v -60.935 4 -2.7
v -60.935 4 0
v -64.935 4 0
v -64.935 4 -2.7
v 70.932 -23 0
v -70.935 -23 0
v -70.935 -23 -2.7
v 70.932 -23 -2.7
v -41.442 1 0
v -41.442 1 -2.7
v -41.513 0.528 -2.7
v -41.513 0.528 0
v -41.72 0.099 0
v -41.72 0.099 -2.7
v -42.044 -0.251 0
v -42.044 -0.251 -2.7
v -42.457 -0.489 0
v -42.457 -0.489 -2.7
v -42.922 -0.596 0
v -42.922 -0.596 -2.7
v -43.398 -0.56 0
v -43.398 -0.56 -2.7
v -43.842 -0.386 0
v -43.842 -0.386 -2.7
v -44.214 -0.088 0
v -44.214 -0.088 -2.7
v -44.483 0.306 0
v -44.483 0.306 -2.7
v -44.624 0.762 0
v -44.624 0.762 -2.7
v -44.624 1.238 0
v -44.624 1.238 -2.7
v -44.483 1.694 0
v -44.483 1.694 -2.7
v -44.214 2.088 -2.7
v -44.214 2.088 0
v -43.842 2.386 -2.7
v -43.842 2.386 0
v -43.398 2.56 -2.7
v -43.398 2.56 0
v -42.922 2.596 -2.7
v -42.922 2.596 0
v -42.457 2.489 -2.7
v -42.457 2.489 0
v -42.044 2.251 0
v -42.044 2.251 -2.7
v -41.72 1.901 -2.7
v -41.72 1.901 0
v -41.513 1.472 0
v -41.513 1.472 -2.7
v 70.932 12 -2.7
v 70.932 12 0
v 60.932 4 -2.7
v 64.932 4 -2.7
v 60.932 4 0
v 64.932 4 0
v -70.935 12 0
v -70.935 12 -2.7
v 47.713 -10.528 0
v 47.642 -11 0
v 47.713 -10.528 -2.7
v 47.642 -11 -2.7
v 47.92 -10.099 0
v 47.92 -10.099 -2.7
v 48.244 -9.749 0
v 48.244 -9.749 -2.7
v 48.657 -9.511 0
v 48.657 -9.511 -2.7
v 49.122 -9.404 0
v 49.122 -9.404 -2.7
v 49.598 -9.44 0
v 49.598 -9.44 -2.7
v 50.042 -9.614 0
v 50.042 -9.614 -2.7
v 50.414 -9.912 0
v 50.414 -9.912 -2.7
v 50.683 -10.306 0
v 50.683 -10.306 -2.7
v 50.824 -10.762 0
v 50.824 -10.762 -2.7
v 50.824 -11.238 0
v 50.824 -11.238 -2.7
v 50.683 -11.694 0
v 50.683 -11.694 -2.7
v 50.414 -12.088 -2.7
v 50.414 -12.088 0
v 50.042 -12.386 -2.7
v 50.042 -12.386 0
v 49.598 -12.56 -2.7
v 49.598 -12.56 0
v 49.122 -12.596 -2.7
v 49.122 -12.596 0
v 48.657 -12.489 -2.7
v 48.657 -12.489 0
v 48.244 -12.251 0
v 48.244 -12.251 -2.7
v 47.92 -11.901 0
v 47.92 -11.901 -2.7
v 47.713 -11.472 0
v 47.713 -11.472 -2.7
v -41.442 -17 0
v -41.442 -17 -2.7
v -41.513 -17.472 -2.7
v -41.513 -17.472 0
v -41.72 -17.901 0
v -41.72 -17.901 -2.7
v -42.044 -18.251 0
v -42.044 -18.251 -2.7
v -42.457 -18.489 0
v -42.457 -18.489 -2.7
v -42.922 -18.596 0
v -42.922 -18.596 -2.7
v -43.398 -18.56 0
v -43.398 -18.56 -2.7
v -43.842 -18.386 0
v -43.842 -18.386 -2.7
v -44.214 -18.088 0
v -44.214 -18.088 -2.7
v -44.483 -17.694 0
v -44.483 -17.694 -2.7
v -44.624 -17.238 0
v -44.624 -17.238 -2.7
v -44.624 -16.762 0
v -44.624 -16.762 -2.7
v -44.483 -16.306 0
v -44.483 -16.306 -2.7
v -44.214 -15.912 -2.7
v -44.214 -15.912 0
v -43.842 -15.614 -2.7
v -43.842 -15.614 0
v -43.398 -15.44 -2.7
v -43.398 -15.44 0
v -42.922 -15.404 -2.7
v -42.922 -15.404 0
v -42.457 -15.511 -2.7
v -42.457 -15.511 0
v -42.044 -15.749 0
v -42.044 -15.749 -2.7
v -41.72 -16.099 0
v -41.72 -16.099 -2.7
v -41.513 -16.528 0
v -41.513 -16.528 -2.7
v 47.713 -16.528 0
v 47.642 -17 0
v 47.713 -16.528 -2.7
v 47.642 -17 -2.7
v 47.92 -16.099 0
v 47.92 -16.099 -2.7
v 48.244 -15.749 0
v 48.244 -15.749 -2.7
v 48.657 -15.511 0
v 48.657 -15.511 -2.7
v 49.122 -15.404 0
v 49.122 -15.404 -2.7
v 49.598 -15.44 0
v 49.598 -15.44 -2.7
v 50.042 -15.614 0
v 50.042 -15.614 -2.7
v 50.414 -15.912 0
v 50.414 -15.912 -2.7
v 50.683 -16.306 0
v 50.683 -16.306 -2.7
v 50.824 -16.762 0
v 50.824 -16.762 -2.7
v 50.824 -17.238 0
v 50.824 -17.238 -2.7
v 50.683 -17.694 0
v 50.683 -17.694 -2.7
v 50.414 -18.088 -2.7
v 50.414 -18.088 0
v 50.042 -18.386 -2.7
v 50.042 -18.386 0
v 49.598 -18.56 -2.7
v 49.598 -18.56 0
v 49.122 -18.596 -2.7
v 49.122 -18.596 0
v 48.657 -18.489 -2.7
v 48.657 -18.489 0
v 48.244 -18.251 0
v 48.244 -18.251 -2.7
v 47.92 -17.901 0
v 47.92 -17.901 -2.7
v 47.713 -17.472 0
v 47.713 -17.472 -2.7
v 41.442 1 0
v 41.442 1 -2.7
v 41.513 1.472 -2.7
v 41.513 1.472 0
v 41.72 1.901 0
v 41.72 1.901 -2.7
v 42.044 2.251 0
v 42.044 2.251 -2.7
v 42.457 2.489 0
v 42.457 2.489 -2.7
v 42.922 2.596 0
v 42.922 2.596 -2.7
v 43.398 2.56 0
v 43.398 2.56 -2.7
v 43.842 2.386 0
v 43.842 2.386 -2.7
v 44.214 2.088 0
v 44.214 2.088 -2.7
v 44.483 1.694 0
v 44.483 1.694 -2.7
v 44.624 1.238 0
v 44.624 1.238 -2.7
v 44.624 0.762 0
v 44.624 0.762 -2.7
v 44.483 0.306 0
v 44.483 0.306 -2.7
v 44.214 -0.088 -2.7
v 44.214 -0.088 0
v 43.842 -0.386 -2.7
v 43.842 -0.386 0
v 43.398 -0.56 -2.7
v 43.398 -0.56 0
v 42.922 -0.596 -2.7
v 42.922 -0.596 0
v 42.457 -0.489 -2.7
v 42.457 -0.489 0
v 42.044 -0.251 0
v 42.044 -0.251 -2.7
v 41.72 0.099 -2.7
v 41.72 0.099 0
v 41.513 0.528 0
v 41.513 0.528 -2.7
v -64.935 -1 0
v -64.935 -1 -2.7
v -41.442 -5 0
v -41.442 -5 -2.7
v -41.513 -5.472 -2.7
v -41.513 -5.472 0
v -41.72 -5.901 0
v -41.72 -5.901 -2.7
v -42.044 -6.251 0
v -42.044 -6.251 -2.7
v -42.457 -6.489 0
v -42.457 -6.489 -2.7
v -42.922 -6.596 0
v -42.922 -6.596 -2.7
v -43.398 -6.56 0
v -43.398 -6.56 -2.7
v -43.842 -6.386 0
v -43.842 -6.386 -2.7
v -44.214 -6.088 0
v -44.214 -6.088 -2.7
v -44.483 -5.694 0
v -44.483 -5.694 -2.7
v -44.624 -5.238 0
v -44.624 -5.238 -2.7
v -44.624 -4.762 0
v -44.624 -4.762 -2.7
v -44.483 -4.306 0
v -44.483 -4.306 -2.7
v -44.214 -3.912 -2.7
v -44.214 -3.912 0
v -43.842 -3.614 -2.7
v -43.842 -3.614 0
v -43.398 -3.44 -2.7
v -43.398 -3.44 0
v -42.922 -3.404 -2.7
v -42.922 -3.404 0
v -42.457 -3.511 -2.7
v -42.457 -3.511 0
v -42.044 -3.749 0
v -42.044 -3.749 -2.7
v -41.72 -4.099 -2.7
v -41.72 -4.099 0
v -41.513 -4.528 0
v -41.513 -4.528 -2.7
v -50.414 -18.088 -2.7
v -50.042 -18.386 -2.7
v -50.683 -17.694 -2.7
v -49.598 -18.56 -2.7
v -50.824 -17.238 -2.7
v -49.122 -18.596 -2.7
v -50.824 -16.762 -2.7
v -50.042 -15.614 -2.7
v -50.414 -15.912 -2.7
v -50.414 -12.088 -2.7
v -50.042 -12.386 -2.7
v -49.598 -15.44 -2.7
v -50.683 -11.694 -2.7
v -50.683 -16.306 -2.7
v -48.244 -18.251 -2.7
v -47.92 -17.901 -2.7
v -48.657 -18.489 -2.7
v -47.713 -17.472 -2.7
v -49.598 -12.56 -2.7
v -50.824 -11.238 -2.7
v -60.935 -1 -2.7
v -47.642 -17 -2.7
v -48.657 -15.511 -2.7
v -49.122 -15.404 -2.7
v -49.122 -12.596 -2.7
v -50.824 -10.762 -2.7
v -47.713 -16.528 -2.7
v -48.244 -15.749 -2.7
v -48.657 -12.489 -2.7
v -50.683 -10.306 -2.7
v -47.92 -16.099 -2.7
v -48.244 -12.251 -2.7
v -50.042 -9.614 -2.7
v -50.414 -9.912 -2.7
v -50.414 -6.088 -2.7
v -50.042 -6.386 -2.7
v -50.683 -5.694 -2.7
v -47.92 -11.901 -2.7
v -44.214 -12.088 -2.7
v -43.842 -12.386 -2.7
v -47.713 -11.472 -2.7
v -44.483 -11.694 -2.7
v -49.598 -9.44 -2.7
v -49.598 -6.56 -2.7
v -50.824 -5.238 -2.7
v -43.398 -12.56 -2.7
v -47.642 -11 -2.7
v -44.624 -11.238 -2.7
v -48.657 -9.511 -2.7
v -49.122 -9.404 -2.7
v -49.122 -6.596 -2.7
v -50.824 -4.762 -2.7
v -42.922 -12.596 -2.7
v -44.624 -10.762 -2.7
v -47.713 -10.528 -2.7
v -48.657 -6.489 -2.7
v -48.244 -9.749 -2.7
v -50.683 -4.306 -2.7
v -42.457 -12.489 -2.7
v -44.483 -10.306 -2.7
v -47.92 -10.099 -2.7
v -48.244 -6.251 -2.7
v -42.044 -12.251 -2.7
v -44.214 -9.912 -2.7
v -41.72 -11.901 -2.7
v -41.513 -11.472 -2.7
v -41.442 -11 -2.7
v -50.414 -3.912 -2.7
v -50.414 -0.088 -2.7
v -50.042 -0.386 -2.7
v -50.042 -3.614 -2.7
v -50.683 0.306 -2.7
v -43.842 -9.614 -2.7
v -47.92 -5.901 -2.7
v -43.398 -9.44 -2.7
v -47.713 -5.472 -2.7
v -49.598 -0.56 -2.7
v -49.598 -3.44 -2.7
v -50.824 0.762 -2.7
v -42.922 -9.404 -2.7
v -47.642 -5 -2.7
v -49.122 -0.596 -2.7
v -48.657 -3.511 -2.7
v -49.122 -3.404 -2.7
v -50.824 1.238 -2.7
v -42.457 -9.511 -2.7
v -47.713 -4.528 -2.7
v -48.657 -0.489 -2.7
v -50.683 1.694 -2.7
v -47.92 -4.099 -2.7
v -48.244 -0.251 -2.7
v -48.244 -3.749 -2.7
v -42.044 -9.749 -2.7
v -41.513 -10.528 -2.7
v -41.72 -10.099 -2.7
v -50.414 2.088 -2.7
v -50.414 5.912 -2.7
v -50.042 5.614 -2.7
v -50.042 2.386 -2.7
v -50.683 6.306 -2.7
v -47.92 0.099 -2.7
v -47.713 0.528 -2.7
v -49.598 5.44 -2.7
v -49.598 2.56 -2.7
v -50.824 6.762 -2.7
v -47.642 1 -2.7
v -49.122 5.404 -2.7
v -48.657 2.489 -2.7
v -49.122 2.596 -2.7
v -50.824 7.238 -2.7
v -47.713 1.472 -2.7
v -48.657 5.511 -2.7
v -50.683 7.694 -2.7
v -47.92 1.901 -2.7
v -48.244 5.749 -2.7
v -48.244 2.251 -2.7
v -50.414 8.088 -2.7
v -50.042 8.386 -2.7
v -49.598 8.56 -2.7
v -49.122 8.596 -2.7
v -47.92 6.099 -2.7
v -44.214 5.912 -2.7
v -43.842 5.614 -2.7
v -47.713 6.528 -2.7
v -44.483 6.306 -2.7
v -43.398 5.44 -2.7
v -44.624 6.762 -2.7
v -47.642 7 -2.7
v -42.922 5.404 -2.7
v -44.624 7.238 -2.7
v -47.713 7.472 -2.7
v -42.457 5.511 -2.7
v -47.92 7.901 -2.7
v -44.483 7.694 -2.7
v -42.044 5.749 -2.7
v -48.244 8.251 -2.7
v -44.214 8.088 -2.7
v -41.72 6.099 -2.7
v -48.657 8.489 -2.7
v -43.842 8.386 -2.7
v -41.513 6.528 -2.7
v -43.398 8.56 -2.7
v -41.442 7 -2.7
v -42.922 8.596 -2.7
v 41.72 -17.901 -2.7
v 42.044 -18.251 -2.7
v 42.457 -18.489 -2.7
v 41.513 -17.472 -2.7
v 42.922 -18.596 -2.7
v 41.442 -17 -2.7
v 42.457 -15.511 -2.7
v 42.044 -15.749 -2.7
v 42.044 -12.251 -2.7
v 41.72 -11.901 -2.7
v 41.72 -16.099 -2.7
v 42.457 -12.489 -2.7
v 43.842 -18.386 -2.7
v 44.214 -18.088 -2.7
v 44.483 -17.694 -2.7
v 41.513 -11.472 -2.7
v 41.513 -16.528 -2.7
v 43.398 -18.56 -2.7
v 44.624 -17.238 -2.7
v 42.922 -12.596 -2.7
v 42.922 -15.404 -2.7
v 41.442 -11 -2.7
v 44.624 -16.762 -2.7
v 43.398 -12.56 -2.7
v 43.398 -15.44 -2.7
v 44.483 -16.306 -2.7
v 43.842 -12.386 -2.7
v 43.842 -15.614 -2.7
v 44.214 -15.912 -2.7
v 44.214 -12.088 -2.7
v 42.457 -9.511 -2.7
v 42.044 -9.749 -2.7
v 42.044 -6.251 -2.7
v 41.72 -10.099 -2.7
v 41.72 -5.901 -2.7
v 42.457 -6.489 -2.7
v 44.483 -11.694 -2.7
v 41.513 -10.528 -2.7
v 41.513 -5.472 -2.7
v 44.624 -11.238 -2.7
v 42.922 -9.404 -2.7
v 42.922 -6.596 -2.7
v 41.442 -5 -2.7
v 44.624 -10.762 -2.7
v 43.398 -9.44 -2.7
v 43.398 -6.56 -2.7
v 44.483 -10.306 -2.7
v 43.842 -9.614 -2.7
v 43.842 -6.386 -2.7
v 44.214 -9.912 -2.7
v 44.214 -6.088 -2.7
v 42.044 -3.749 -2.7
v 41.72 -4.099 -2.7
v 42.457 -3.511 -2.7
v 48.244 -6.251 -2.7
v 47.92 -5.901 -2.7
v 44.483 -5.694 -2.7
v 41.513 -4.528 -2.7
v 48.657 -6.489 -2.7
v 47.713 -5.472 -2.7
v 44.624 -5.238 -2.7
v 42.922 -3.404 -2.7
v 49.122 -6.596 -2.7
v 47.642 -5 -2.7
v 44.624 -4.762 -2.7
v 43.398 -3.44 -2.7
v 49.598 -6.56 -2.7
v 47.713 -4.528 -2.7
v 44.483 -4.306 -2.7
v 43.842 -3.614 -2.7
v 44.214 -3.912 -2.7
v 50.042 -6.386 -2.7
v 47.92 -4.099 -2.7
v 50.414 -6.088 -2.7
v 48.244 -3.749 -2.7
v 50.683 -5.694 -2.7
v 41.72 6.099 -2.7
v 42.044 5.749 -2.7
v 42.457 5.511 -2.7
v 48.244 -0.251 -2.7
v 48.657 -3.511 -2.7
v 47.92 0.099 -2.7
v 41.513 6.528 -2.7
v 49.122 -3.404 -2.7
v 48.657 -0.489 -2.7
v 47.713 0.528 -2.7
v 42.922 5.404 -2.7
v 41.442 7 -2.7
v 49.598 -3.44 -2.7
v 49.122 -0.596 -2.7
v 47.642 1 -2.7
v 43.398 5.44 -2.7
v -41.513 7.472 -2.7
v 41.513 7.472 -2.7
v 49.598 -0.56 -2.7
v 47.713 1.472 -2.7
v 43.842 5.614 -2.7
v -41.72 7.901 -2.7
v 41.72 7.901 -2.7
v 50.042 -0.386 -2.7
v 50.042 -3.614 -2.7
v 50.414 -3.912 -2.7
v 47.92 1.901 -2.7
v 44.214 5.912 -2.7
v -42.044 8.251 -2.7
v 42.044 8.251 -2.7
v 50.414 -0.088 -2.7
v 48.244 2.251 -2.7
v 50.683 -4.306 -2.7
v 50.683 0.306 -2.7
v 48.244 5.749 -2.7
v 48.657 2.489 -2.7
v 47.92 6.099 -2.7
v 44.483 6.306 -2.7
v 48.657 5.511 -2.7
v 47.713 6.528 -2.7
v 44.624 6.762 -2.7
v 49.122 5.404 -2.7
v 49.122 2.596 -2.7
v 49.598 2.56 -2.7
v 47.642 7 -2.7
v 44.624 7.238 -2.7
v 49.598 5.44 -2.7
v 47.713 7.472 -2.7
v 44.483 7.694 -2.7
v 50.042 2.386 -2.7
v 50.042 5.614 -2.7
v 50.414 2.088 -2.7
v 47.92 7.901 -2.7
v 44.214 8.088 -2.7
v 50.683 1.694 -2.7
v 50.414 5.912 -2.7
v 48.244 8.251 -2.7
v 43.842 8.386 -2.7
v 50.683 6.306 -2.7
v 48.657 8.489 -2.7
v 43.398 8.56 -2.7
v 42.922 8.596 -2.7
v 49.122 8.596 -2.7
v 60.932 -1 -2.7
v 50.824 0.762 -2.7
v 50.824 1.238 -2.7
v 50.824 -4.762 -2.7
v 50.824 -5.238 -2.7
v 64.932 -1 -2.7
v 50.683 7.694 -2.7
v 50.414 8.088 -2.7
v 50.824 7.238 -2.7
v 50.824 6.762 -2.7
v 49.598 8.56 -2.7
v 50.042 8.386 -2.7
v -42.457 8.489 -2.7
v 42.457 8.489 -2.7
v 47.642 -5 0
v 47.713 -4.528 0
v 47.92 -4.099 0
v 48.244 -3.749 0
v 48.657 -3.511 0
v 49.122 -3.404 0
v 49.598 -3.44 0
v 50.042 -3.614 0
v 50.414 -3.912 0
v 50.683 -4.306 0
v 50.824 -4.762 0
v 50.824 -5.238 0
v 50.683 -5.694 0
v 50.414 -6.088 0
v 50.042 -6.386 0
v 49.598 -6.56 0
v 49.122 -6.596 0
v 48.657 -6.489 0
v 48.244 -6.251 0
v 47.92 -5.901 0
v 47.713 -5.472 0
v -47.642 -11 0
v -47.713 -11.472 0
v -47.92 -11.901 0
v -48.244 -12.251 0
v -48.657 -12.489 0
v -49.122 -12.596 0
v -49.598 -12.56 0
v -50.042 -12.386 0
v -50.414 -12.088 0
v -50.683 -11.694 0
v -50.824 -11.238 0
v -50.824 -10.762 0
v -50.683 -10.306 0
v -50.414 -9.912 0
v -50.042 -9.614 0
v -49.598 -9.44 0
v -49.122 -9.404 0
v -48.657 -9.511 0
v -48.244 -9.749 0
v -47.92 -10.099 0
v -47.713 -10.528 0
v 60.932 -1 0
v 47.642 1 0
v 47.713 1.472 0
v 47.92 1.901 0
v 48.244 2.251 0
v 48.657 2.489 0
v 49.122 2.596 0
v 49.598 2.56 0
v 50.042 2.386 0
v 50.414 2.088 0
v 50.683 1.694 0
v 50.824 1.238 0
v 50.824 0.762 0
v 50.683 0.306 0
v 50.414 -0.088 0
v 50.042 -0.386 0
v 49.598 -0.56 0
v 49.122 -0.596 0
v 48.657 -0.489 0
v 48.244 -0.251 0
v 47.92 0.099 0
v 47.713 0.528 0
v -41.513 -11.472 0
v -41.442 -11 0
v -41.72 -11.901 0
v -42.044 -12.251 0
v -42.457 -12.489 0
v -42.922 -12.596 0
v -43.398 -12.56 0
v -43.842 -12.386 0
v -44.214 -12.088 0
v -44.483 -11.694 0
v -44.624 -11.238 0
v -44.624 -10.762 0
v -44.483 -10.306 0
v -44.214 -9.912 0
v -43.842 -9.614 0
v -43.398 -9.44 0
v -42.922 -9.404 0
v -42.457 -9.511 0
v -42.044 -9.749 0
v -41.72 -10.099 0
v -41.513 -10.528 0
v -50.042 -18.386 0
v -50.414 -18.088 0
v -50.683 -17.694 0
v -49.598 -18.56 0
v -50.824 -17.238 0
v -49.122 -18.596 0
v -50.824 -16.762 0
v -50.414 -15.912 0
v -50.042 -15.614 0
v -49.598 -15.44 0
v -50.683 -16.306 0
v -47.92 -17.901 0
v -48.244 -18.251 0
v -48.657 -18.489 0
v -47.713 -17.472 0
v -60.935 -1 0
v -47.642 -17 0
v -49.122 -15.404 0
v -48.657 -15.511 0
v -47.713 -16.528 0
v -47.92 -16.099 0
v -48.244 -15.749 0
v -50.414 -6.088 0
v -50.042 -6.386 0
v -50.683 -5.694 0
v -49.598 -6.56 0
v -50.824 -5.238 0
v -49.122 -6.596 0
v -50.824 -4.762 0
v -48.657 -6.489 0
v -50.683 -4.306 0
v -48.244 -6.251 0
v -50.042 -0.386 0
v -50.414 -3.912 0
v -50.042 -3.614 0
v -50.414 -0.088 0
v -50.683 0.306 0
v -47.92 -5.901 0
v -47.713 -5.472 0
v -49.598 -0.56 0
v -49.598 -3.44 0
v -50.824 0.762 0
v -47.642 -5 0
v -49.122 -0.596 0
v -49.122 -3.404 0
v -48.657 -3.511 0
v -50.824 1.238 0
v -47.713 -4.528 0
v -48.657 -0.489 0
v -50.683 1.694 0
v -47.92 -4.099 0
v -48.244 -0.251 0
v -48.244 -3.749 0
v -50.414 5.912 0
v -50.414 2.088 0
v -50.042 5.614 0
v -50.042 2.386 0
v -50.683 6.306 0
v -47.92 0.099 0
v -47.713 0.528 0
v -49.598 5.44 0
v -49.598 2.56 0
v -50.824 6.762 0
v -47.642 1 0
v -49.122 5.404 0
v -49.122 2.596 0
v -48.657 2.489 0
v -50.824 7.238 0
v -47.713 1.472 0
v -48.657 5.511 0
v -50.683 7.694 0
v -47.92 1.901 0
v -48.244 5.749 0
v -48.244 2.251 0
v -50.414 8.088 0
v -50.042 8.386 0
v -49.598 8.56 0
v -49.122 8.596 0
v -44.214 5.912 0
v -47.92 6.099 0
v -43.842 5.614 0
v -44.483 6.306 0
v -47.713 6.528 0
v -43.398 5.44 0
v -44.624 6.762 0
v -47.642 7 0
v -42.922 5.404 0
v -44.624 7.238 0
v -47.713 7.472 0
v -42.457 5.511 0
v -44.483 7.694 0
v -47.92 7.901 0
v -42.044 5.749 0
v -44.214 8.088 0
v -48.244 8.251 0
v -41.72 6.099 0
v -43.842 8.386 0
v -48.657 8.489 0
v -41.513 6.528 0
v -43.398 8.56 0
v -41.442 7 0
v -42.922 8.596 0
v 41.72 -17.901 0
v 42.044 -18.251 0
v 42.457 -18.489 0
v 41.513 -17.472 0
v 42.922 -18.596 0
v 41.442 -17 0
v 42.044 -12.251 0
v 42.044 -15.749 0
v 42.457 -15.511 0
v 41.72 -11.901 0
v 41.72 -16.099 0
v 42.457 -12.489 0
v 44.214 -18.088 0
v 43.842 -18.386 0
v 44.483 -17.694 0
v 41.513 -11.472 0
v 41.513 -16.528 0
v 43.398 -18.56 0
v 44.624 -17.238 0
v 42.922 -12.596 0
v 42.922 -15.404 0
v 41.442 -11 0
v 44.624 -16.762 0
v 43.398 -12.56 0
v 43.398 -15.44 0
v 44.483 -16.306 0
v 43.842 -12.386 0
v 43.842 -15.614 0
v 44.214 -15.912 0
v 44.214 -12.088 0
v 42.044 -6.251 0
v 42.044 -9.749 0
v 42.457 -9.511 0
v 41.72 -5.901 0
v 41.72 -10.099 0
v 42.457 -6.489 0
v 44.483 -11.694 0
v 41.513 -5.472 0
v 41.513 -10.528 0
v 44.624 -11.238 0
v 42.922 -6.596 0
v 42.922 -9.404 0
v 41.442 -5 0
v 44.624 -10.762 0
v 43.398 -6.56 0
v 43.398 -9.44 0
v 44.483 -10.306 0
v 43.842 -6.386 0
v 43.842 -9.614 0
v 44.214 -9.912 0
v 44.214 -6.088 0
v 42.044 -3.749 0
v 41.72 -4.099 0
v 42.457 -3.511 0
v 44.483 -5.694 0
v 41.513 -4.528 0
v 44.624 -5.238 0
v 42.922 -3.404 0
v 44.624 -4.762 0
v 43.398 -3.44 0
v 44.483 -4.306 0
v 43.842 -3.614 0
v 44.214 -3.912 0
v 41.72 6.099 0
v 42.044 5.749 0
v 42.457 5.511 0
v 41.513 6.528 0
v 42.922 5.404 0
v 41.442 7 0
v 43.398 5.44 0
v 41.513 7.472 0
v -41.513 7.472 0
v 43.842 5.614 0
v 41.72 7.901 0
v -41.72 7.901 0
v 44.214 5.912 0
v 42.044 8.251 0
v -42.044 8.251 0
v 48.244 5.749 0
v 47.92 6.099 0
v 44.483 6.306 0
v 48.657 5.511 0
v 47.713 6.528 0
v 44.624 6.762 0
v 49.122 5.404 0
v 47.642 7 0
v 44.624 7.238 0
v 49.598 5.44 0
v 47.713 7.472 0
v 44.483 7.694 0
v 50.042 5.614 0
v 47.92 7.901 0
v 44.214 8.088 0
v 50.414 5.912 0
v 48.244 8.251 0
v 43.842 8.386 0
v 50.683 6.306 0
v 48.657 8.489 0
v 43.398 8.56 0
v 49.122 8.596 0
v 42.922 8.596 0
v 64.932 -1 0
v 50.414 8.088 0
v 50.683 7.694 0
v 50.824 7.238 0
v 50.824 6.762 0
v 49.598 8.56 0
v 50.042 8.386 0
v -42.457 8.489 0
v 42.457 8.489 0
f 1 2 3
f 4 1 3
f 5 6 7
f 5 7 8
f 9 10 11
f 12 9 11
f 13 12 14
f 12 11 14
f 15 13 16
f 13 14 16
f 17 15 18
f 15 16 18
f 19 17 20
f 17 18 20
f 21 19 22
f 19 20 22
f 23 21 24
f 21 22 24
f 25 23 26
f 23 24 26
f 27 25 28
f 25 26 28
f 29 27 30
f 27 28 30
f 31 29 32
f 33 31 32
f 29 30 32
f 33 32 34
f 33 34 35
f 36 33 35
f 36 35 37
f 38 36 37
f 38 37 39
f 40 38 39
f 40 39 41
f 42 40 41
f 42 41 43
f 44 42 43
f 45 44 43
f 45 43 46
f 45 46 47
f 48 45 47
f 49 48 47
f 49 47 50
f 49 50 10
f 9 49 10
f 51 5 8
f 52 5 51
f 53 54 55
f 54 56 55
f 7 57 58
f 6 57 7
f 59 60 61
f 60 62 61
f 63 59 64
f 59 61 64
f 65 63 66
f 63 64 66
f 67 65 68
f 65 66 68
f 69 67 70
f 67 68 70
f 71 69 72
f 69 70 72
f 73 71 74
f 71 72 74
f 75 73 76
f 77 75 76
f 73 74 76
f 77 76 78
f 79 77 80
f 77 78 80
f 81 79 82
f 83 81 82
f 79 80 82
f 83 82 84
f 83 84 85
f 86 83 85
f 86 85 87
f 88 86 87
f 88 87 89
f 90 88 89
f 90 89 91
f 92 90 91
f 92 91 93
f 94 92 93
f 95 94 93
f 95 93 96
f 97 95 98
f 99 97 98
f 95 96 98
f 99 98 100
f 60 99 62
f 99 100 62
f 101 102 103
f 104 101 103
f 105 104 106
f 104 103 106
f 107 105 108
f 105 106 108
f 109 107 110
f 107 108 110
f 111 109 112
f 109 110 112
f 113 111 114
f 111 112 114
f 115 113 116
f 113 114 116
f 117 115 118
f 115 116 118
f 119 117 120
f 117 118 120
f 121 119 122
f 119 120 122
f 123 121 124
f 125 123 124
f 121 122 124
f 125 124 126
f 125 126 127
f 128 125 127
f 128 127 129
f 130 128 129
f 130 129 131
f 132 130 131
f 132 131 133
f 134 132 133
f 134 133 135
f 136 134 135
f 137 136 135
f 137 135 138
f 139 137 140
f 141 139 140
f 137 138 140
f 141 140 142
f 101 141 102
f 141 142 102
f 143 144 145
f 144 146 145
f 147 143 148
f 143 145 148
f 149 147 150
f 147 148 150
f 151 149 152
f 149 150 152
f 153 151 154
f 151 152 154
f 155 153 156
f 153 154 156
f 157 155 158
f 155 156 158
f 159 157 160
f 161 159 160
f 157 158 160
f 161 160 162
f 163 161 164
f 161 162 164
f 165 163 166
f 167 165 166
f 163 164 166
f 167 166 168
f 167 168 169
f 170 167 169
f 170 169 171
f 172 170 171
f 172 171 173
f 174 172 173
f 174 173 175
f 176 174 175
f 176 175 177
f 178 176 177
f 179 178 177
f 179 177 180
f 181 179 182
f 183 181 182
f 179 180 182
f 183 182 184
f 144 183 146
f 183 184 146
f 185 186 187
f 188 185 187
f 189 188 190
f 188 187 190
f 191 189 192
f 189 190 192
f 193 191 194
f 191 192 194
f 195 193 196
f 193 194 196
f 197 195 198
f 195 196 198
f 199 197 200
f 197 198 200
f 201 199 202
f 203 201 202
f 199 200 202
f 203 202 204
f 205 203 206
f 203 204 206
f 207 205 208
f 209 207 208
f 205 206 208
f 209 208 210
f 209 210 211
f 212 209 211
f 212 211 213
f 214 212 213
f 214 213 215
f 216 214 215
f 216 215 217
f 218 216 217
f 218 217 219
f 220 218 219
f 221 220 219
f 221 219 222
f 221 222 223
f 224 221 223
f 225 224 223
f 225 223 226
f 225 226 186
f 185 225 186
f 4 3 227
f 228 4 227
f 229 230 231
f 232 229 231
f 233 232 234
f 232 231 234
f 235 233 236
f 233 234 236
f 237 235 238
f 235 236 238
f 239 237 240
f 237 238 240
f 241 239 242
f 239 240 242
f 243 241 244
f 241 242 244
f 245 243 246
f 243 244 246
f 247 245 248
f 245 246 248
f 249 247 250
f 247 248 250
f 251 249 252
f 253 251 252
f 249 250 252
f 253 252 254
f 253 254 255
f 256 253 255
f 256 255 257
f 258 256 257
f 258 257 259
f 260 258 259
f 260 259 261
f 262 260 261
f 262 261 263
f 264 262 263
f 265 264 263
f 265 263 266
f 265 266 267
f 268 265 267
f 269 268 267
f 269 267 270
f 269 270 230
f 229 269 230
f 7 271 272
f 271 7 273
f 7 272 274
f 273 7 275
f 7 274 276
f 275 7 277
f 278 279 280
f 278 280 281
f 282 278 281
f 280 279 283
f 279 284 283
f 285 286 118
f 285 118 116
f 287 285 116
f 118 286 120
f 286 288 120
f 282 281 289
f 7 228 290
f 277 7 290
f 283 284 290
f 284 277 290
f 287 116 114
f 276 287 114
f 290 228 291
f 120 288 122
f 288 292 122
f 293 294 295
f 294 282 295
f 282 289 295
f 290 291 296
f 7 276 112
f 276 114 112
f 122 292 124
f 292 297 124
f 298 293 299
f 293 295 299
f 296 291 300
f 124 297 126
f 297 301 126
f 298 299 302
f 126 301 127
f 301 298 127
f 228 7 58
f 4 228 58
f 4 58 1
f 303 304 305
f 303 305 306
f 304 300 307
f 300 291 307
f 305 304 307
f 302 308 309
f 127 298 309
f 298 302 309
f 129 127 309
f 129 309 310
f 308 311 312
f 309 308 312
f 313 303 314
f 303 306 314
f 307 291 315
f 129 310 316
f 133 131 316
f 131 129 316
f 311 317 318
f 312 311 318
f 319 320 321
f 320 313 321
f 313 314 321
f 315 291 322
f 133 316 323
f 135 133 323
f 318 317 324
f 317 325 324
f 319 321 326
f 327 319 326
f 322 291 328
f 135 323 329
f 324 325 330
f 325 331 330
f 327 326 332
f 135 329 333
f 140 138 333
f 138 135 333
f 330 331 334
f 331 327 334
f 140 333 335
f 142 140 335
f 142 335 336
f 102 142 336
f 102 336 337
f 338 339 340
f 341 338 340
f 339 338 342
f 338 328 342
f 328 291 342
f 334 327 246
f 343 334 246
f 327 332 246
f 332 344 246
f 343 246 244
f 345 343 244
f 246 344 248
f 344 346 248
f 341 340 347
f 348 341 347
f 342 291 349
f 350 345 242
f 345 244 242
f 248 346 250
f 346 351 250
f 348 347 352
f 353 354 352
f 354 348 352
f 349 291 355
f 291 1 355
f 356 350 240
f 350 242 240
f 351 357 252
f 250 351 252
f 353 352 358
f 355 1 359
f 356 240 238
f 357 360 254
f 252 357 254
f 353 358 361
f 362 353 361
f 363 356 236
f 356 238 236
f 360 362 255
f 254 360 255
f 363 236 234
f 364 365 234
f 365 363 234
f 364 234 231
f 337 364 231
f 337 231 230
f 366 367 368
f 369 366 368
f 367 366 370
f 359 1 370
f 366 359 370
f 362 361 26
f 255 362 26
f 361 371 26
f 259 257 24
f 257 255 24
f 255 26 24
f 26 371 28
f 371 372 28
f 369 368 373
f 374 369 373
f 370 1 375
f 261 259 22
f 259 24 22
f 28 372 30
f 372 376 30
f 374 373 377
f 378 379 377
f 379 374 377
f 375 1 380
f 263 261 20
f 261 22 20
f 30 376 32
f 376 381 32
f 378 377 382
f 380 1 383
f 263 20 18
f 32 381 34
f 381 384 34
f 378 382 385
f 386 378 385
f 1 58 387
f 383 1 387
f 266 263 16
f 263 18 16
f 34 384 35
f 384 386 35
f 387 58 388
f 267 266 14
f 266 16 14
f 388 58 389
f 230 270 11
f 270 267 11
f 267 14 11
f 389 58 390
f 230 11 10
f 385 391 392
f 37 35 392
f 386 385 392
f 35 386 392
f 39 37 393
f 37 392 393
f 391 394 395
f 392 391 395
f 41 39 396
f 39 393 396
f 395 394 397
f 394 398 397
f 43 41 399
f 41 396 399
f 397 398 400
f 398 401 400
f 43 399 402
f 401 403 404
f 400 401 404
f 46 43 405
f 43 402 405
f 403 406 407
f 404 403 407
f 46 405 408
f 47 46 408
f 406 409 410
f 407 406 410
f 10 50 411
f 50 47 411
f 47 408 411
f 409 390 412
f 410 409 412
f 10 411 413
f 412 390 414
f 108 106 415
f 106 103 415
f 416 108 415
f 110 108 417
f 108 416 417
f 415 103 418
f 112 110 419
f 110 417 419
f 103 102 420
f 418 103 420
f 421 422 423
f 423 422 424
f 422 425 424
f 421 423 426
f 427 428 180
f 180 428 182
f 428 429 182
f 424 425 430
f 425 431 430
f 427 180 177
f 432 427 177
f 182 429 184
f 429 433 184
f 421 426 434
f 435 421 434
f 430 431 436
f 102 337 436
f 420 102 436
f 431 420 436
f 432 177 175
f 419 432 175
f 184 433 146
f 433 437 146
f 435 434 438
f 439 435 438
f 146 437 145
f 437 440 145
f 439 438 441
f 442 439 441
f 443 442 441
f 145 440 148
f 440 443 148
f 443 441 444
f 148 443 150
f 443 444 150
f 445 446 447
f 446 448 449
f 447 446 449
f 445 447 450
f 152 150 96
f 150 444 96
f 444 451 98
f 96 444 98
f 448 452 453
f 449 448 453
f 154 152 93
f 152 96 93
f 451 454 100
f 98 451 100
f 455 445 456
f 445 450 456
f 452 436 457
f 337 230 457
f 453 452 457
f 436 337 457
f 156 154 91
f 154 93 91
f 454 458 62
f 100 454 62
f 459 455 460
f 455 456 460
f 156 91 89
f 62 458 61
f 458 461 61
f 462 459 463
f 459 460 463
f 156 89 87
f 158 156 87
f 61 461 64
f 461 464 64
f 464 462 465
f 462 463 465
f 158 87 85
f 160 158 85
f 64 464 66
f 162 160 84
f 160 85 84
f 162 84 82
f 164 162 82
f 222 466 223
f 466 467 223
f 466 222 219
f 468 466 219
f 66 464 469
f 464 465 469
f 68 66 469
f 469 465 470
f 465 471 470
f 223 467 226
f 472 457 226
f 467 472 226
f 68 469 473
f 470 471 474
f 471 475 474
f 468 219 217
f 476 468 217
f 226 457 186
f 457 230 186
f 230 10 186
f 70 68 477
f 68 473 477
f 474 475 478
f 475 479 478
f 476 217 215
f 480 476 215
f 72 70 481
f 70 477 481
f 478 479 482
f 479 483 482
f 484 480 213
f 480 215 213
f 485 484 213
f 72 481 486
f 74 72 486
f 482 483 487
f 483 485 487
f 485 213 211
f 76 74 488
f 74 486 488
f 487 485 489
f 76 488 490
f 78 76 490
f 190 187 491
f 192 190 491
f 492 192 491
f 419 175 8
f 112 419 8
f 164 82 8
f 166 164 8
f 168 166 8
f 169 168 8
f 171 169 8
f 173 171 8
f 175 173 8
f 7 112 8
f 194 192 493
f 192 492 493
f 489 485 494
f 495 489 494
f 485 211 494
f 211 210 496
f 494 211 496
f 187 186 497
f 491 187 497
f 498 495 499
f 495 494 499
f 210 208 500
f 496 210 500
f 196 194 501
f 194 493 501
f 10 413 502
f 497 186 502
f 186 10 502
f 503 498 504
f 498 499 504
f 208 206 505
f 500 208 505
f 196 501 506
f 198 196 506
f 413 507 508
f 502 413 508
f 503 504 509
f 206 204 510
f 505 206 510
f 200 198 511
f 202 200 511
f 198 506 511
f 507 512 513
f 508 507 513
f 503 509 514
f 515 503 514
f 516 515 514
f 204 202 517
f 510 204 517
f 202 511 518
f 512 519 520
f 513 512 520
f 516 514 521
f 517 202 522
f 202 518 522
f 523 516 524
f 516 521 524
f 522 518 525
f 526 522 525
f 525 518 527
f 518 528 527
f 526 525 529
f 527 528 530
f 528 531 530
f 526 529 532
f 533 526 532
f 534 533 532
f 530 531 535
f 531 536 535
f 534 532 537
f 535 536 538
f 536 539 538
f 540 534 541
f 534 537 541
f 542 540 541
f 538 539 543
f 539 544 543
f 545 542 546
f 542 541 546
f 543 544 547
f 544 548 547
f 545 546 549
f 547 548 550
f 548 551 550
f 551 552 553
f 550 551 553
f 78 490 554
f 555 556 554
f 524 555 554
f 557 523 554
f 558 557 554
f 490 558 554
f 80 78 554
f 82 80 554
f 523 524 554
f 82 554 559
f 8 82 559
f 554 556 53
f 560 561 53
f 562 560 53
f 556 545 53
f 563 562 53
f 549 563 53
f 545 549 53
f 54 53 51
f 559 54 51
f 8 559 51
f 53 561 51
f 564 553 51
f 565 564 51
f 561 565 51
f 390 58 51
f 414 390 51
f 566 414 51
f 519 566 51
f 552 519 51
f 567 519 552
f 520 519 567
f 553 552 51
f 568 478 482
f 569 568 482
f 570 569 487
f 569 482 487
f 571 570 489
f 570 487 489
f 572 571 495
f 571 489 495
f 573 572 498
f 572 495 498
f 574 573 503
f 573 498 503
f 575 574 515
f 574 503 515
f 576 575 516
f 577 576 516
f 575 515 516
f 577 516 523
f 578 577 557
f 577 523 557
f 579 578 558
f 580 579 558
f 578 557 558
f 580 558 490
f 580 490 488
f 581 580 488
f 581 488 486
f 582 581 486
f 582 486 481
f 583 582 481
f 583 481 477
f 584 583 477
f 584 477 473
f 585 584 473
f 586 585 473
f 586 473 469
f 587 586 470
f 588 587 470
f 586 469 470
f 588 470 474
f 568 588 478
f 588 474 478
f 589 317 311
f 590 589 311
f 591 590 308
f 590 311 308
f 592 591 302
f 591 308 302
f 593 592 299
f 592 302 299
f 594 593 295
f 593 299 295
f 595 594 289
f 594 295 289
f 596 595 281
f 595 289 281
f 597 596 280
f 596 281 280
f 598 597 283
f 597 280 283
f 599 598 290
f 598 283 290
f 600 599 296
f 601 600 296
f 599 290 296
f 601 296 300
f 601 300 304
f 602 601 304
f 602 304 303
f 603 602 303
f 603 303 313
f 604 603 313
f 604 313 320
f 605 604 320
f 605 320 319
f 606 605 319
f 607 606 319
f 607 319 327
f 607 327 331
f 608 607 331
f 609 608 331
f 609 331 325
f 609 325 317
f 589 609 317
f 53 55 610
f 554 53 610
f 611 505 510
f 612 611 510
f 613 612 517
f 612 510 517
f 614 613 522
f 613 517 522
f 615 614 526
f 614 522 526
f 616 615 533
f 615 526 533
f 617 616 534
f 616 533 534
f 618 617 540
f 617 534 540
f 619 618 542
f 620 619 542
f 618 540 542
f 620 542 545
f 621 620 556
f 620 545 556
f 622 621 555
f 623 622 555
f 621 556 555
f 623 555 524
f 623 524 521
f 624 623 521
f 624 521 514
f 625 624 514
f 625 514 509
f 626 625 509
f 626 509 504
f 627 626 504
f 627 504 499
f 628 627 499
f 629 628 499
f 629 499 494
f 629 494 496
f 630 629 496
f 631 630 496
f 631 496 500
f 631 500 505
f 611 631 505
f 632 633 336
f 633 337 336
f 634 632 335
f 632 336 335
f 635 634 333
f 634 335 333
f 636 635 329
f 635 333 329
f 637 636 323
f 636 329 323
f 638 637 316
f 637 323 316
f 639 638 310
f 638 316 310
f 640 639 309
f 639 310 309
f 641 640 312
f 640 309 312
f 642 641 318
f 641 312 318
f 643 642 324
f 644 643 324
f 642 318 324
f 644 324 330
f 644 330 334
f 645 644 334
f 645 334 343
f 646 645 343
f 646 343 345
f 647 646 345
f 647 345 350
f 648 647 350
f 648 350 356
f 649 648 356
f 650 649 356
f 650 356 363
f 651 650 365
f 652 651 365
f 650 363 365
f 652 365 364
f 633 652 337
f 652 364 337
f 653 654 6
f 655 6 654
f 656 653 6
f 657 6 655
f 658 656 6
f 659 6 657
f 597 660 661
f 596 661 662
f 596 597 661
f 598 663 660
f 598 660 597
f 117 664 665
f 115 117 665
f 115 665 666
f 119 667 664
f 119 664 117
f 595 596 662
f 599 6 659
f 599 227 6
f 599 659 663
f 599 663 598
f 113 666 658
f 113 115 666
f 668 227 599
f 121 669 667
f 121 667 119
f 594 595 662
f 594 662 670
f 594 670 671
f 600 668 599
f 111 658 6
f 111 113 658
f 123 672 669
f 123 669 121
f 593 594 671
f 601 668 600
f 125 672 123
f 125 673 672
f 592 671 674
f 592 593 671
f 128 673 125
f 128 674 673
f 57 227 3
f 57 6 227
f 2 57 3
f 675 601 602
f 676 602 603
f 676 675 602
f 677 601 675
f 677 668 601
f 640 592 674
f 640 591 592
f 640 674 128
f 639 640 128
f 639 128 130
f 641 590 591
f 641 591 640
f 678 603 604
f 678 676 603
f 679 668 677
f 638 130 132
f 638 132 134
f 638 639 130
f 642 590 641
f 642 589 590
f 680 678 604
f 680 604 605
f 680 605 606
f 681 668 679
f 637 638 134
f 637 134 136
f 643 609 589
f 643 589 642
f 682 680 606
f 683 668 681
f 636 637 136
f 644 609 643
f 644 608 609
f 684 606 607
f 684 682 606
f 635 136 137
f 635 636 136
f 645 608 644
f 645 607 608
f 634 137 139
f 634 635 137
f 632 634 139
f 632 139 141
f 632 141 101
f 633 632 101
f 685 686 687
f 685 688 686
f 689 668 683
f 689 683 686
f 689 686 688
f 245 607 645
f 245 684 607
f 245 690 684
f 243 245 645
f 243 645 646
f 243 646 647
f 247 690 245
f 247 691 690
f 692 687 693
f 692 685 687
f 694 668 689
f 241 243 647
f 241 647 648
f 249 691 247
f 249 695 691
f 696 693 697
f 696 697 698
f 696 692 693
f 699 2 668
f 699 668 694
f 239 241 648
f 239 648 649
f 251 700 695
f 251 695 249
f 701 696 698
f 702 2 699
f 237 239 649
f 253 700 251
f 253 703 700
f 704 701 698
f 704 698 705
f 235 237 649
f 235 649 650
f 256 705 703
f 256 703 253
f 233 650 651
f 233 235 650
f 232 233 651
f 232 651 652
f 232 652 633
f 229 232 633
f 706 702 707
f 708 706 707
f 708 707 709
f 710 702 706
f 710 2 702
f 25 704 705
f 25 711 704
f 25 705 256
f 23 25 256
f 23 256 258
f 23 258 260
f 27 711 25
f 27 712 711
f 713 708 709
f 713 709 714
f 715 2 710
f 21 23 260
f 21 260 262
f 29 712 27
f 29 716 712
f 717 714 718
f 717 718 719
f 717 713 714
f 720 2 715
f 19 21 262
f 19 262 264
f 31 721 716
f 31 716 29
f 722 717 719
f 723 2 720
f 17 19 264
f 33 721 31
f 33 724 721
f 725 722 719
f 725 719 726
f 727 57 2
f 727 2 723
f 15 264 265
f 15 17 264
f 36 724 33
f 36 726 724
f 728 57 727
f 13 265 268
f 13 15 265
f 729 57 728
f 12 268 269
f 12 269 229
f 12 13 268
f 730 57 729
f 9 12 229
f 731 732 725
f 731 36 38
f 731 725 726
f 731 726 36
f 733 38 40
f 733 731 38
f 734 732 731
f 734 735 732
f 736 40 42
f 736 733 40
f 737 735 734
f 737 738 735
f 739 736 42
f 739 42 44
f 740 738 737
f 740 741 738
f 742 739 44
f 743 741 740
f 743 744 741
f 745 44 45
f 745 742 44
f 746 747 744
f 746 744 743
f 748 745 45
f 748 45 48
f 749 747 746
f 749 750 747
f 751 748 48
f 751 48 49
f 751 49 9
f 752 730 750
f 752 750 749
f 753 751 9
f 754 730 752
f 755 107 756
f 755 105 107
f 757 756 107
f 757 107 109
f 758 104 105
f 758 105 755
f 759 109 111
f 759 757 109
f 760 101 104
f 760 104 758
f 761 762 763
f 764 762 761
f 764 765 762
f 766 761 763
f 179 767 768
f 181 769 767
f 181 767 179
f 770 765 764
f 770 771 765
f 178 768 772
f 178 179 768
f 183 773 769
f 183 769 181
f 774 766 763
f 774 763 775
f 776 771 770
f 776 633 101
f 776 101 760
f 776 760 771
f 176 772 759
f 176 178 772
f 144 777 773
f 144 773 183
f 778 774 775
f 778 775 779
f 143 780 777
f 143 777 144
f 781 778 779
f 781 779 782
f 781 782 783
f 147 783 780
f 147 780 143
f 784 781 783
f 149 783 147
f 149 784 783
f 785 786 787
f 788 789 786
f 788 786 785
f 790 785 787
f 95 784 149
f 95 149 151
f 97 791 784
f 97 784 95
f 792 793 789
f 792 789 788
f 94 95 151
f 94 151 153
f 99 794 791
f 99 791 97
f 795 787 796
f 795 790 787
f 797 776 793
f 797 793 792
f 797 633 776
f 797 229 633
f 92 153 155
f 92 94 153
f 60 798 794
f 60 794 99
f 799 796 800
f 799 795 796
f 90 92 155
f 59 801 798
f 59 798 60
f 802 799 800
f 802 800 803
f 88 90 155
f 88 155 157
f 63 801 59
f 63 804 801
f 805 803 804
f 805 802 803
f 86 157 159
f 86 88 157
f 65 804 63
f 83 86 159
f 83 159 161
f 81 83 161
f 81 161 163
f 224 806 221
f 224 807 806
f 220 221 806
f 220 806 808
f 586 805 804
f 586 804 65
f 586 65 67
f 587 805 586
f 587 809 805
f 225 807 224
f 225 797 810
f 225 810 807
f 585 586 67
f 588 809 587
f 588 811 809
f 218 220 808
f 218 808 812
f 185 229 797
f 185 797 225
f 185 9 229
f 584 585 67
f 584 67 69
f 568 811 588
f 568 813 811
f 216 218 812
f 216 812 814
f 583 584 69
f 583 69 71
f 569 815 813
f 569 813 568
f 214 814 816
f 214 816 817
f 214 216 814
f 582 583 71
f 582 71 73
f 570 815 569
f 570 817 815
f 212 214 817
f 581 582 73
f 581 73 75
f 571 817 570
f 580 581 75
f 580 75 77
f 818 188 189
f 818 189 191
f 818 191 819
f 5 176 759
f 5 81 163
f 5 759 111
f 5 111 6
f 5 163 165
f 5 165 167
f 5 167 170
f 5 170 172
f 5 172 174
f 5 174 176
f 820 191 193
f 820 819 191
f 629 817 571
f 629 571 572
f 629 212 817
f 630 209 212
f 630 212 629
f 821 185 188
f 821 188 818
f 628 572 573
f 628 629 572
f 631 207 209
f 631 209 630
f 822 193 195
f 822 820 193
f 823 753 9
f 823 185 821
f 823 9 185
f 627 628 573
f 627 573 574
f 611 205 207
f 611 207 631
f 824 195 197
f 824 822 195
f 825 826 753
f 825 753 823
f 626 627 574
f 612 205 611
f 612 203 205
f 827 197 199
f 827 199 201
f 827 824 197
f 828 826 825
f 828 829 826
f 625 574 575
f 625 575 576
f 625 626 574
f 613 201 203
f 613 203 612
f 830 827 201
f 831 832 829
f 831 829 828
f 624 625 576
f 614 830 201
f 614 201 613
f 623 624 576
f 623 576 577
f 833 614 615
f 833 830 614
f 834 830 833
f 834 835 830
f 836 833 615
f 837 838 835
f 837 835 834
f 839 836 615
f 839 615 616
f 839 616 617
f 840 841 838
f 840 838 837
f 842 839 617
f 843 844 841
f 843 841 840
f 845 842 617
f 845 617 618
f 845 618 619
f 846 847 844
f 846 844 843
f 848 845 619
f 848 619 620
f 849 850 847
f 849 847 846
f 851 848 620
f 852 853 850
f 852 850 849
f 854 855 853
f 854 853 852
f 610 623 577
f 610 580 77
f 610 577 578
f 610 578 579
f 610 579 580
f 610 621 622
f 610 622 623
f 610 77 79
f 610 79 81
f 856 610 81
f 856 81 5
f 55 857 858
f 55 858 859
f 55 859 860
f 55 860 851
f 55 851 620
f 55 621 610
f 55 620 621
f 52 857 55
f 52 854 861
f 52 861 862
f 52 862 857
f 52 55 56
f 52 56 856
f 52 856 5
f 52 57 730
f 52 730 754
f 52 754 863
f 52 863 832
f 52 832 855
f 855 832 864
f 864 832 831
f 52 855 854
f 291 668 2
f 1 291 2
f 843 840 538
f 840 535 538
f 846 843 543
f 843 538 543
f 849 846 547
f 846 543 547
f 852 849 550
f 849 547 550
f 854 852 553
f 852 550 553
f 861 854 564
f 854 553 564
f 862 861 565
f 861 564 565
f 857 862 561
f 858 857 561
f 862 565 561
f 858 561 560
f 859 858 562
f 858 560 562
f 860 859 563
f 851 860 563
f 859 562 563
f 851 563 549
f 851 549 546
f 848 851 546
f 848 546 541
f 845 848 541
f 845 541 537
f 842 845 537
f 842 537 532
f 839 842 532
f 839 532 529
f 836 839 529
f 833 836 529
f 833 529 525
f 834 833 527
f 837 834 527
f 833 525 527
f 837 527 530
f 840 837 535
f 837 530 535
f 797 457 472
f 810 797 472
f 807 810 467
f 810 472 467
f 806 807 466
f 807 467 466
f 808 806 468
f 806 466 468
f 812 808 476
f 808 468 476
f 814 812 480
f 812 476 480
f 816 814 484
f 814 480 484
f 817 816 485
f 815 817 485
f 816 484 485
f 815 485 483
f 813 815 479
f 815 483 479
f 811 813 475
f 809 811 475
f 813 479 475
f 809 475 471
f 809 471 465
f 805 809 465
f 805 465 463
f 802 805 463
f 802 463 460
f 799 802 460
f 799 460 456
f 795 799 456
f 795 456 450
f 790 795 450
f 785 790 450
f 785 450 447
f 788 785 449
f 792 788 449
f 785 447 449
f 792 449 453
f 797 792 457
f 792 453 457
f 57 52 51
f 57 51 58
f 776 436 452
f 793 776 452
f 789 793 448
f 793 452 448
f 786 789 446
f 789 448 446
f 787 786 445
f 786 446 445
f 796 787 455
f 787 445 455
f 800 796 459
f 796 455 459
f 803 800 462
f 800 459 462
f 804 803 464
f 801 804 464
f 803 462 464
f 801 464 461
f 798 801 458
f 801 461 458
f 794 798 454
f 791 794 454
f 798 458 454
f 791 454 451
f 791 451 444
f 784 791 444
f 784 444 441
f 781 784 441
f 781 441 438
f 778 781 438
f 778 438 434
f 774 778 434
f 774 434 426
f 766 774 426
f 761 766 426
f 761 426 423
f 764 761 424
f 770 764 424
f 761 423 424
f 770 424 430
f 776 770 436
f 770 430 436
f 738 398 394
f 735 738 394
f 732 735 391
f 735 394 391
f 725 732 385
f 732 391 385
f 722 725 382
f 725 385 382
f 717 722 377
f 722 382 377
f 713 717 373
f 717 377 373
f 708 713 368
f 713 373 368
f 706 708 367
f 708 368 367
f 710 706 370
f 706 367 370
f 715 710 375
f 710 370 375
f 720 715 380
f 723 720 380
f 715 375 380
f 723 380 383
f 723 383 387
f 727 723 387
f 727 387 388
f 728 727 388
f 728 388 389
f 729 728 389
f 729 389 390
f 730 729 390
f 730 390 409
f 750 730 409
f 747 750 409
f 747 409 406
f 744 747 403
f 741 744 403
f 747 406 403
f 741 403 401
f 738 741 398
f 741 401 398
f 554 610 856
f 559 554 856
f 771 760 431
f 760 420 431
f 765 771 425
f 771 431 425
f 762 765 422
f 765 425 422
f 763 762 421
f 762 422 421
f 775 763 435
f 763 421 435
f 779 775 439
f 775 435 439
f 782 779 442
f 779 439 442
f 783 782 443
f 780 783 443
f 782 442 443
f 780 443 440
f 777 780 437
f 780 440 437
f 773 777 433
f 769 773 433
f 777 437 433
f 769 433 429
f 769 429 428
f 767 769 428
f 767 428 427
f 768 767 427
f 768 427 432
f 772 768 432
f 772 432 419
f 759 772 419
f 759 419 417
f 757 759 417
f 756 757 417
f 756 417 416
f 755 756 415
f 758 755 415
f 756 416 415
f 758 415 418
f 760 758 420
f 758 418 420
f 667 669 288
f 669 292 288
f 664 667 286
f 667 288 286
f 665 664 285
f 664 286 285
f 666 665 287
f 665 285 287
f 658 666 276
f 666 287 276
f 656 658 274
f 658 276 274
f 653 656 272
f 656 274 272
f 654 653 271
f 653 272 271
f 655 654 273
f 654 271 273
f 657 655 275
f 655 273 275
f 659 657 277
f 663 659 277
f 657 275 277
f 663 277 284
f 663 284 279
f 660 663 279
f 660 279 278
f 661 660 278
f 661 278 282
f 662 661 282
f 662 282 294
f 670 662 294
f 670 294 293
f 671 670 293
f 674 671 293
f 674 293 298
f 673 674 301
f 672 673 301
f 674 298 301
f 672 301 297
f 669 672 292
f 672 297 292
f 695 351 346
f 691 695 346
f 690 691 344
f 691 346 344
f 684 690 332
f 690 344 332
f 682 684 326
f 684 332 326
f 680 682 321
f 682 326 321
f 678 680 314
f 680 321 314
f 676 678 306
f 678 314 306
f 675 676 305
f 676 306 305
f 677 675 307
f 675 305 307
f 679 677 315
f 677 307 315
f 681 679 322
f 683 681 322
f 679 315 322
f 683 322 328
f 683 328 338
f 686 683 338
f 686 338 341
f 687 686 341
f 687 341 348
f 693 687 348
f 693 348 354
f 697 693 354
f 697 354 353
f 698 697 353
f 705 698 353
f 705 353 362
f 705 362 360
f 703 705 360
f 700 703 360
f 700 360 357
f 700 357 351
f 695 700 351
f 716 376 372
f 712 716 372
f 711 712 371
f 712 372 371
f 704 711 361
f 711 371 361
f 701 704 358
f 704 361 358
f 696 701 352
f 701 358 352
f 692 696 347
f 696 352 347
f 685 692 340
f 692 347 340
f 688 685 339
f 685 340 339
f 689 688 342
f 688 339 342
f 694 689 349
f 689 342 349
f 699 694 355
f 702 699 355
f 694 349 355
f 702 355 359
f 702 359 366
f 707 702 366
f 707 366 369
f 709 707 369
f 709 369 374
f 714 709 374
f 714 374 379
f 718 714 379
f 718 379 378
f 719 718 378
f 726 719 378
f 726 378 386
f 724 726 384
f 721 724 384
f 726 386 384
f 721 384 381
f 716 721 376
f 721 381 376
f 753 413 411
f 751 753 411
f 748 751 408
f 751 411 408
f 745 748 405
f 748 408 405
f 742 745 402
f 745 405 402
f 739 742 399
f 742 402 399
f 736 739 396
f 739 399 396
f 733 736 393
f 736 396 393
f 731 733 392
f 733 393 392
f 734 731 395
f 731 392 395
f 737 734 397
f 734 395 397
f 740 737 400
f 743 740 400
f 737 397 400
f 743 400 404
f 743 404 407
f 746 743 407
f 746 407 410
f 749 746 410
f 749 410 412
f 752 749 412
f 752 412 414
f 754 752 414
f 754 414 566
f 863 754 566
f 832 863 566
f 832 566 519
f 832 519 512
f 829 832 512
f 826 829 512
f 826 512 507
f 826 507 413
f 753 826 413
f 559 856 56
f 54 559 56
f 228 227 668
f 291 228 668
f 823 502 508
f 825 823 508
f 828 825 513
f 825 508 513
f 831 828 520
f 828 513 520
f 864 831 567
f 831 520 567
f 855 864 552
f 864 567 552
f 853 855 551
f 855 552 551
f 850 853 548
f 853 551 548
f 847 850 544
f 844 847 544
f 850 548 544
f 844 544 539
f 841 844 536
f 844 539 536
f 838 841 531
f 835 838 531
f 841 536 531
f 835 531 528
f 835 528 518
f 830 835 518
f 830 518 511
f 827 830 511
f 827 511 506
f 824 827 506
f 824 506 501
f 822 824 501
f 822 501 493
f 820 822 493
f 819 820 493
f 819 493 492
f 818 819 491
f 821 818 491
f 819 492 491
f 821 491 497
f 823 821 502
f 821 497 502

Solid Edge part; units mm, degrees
sketch "Sketch1" plane through (0, 0, 0) normal (0, 0, 1) x (1, 0, 0)
  line L0 (70.9315, 12) -> (-70.935, 12)
  line L1 (-70.935, 12) -> (-70.935, -23)
  line L2 (-70.935, -23) -> (70.9315, -23)
  line L3 (70.9315, -23) -> (70.9315, 12)
extrude "Protrusion1" add sketch "Sketch1" against normal blind 2.7
sketch "Sketch2" plane through (0, -5.5, -2.7) normal (0, 0, -1) x (-1, 0, 0)
  circle A0 centre (-49.2415, 12.5) radius 1.6
  circle A1 centre (-43.0415, 12.5) radius 1.6
  circle A2 centre (-49.2415, 6.5) radius 1.6
  circle A3 centre (-43.0415, 6.5) radius 1.6
  circle A4 centre (-49.2415, 0.5) radius 1.6
  circle A5 centre (-43.0415, 0.5) radius 1.6
  circle A6 centre (-49.2415, -5.5) radius 1.6
  circle A7 centre (-49.2415, -11.5) radius 1.6
  circle A8 centre (-43.0415, -5.5) radius 1.6
  circle A9 centre (-43.0415, -11.5) radius 1.6
  dimension "D1" = 3.2
  dimension "D2" = 3.2
  dimension "D3" = 3.2
  dimension "D4" = 3.2
  dimension "D5" = 12
  dimension "D6" = 6.2
  dimension "D7" = 5
  dimension "D8" = 21.69
  dimension "D9" = 6.2
  dimension "D10" = 6
  dimension "D11" = 6.2
  dimension "D12" = 6.2
  dimension "D13" = 6
  dimension "D14" = 6
extrude "Cutout1" cut sketch "Sketch2" against normal through all
mirror "Mirror1" about plane through (0, 0, 0) normal (1, 0, 0) of "Cutout1"
sketch "Sketch3" plane through (0, 0, 0) normal (0, 0, 1) x (1, 0, 0)
  line L0 (-64.935, 4) -> (-64.935, -1)
  line L1 (-64.935, -1) -> (-60.935, -1)
  line L2 (-60.935, -1) -> (-60.935, 4)
  line L3 (-60.935, 4) -> (-64.935, 4)
  line L4 (60.9315, -1) -> (64.9315, -1)
  line L5 (64.9315, -1) -> (64.9315, 4)
  line L6 (64.9315, 4) -> (60.9315, 4)
  line L7 (60.9315, 4) -> (60.9315, -1)
  dimension "D1" = 35
  dimension "D2" = 141.8665
  dimension "D3" = 5
  dimension "D4" = 5
  dimension "D5" = 4
  dimension "D6" = 4
  dimension "D7" = 23
  dimension "D8" = 6
  dimension "D9" = 8
  dimension "D10" = 8
  dimension "D11" = 6
extrude "Cutout2" cut sketch "Sketch3" against normal up to next
properties material "MDF"
